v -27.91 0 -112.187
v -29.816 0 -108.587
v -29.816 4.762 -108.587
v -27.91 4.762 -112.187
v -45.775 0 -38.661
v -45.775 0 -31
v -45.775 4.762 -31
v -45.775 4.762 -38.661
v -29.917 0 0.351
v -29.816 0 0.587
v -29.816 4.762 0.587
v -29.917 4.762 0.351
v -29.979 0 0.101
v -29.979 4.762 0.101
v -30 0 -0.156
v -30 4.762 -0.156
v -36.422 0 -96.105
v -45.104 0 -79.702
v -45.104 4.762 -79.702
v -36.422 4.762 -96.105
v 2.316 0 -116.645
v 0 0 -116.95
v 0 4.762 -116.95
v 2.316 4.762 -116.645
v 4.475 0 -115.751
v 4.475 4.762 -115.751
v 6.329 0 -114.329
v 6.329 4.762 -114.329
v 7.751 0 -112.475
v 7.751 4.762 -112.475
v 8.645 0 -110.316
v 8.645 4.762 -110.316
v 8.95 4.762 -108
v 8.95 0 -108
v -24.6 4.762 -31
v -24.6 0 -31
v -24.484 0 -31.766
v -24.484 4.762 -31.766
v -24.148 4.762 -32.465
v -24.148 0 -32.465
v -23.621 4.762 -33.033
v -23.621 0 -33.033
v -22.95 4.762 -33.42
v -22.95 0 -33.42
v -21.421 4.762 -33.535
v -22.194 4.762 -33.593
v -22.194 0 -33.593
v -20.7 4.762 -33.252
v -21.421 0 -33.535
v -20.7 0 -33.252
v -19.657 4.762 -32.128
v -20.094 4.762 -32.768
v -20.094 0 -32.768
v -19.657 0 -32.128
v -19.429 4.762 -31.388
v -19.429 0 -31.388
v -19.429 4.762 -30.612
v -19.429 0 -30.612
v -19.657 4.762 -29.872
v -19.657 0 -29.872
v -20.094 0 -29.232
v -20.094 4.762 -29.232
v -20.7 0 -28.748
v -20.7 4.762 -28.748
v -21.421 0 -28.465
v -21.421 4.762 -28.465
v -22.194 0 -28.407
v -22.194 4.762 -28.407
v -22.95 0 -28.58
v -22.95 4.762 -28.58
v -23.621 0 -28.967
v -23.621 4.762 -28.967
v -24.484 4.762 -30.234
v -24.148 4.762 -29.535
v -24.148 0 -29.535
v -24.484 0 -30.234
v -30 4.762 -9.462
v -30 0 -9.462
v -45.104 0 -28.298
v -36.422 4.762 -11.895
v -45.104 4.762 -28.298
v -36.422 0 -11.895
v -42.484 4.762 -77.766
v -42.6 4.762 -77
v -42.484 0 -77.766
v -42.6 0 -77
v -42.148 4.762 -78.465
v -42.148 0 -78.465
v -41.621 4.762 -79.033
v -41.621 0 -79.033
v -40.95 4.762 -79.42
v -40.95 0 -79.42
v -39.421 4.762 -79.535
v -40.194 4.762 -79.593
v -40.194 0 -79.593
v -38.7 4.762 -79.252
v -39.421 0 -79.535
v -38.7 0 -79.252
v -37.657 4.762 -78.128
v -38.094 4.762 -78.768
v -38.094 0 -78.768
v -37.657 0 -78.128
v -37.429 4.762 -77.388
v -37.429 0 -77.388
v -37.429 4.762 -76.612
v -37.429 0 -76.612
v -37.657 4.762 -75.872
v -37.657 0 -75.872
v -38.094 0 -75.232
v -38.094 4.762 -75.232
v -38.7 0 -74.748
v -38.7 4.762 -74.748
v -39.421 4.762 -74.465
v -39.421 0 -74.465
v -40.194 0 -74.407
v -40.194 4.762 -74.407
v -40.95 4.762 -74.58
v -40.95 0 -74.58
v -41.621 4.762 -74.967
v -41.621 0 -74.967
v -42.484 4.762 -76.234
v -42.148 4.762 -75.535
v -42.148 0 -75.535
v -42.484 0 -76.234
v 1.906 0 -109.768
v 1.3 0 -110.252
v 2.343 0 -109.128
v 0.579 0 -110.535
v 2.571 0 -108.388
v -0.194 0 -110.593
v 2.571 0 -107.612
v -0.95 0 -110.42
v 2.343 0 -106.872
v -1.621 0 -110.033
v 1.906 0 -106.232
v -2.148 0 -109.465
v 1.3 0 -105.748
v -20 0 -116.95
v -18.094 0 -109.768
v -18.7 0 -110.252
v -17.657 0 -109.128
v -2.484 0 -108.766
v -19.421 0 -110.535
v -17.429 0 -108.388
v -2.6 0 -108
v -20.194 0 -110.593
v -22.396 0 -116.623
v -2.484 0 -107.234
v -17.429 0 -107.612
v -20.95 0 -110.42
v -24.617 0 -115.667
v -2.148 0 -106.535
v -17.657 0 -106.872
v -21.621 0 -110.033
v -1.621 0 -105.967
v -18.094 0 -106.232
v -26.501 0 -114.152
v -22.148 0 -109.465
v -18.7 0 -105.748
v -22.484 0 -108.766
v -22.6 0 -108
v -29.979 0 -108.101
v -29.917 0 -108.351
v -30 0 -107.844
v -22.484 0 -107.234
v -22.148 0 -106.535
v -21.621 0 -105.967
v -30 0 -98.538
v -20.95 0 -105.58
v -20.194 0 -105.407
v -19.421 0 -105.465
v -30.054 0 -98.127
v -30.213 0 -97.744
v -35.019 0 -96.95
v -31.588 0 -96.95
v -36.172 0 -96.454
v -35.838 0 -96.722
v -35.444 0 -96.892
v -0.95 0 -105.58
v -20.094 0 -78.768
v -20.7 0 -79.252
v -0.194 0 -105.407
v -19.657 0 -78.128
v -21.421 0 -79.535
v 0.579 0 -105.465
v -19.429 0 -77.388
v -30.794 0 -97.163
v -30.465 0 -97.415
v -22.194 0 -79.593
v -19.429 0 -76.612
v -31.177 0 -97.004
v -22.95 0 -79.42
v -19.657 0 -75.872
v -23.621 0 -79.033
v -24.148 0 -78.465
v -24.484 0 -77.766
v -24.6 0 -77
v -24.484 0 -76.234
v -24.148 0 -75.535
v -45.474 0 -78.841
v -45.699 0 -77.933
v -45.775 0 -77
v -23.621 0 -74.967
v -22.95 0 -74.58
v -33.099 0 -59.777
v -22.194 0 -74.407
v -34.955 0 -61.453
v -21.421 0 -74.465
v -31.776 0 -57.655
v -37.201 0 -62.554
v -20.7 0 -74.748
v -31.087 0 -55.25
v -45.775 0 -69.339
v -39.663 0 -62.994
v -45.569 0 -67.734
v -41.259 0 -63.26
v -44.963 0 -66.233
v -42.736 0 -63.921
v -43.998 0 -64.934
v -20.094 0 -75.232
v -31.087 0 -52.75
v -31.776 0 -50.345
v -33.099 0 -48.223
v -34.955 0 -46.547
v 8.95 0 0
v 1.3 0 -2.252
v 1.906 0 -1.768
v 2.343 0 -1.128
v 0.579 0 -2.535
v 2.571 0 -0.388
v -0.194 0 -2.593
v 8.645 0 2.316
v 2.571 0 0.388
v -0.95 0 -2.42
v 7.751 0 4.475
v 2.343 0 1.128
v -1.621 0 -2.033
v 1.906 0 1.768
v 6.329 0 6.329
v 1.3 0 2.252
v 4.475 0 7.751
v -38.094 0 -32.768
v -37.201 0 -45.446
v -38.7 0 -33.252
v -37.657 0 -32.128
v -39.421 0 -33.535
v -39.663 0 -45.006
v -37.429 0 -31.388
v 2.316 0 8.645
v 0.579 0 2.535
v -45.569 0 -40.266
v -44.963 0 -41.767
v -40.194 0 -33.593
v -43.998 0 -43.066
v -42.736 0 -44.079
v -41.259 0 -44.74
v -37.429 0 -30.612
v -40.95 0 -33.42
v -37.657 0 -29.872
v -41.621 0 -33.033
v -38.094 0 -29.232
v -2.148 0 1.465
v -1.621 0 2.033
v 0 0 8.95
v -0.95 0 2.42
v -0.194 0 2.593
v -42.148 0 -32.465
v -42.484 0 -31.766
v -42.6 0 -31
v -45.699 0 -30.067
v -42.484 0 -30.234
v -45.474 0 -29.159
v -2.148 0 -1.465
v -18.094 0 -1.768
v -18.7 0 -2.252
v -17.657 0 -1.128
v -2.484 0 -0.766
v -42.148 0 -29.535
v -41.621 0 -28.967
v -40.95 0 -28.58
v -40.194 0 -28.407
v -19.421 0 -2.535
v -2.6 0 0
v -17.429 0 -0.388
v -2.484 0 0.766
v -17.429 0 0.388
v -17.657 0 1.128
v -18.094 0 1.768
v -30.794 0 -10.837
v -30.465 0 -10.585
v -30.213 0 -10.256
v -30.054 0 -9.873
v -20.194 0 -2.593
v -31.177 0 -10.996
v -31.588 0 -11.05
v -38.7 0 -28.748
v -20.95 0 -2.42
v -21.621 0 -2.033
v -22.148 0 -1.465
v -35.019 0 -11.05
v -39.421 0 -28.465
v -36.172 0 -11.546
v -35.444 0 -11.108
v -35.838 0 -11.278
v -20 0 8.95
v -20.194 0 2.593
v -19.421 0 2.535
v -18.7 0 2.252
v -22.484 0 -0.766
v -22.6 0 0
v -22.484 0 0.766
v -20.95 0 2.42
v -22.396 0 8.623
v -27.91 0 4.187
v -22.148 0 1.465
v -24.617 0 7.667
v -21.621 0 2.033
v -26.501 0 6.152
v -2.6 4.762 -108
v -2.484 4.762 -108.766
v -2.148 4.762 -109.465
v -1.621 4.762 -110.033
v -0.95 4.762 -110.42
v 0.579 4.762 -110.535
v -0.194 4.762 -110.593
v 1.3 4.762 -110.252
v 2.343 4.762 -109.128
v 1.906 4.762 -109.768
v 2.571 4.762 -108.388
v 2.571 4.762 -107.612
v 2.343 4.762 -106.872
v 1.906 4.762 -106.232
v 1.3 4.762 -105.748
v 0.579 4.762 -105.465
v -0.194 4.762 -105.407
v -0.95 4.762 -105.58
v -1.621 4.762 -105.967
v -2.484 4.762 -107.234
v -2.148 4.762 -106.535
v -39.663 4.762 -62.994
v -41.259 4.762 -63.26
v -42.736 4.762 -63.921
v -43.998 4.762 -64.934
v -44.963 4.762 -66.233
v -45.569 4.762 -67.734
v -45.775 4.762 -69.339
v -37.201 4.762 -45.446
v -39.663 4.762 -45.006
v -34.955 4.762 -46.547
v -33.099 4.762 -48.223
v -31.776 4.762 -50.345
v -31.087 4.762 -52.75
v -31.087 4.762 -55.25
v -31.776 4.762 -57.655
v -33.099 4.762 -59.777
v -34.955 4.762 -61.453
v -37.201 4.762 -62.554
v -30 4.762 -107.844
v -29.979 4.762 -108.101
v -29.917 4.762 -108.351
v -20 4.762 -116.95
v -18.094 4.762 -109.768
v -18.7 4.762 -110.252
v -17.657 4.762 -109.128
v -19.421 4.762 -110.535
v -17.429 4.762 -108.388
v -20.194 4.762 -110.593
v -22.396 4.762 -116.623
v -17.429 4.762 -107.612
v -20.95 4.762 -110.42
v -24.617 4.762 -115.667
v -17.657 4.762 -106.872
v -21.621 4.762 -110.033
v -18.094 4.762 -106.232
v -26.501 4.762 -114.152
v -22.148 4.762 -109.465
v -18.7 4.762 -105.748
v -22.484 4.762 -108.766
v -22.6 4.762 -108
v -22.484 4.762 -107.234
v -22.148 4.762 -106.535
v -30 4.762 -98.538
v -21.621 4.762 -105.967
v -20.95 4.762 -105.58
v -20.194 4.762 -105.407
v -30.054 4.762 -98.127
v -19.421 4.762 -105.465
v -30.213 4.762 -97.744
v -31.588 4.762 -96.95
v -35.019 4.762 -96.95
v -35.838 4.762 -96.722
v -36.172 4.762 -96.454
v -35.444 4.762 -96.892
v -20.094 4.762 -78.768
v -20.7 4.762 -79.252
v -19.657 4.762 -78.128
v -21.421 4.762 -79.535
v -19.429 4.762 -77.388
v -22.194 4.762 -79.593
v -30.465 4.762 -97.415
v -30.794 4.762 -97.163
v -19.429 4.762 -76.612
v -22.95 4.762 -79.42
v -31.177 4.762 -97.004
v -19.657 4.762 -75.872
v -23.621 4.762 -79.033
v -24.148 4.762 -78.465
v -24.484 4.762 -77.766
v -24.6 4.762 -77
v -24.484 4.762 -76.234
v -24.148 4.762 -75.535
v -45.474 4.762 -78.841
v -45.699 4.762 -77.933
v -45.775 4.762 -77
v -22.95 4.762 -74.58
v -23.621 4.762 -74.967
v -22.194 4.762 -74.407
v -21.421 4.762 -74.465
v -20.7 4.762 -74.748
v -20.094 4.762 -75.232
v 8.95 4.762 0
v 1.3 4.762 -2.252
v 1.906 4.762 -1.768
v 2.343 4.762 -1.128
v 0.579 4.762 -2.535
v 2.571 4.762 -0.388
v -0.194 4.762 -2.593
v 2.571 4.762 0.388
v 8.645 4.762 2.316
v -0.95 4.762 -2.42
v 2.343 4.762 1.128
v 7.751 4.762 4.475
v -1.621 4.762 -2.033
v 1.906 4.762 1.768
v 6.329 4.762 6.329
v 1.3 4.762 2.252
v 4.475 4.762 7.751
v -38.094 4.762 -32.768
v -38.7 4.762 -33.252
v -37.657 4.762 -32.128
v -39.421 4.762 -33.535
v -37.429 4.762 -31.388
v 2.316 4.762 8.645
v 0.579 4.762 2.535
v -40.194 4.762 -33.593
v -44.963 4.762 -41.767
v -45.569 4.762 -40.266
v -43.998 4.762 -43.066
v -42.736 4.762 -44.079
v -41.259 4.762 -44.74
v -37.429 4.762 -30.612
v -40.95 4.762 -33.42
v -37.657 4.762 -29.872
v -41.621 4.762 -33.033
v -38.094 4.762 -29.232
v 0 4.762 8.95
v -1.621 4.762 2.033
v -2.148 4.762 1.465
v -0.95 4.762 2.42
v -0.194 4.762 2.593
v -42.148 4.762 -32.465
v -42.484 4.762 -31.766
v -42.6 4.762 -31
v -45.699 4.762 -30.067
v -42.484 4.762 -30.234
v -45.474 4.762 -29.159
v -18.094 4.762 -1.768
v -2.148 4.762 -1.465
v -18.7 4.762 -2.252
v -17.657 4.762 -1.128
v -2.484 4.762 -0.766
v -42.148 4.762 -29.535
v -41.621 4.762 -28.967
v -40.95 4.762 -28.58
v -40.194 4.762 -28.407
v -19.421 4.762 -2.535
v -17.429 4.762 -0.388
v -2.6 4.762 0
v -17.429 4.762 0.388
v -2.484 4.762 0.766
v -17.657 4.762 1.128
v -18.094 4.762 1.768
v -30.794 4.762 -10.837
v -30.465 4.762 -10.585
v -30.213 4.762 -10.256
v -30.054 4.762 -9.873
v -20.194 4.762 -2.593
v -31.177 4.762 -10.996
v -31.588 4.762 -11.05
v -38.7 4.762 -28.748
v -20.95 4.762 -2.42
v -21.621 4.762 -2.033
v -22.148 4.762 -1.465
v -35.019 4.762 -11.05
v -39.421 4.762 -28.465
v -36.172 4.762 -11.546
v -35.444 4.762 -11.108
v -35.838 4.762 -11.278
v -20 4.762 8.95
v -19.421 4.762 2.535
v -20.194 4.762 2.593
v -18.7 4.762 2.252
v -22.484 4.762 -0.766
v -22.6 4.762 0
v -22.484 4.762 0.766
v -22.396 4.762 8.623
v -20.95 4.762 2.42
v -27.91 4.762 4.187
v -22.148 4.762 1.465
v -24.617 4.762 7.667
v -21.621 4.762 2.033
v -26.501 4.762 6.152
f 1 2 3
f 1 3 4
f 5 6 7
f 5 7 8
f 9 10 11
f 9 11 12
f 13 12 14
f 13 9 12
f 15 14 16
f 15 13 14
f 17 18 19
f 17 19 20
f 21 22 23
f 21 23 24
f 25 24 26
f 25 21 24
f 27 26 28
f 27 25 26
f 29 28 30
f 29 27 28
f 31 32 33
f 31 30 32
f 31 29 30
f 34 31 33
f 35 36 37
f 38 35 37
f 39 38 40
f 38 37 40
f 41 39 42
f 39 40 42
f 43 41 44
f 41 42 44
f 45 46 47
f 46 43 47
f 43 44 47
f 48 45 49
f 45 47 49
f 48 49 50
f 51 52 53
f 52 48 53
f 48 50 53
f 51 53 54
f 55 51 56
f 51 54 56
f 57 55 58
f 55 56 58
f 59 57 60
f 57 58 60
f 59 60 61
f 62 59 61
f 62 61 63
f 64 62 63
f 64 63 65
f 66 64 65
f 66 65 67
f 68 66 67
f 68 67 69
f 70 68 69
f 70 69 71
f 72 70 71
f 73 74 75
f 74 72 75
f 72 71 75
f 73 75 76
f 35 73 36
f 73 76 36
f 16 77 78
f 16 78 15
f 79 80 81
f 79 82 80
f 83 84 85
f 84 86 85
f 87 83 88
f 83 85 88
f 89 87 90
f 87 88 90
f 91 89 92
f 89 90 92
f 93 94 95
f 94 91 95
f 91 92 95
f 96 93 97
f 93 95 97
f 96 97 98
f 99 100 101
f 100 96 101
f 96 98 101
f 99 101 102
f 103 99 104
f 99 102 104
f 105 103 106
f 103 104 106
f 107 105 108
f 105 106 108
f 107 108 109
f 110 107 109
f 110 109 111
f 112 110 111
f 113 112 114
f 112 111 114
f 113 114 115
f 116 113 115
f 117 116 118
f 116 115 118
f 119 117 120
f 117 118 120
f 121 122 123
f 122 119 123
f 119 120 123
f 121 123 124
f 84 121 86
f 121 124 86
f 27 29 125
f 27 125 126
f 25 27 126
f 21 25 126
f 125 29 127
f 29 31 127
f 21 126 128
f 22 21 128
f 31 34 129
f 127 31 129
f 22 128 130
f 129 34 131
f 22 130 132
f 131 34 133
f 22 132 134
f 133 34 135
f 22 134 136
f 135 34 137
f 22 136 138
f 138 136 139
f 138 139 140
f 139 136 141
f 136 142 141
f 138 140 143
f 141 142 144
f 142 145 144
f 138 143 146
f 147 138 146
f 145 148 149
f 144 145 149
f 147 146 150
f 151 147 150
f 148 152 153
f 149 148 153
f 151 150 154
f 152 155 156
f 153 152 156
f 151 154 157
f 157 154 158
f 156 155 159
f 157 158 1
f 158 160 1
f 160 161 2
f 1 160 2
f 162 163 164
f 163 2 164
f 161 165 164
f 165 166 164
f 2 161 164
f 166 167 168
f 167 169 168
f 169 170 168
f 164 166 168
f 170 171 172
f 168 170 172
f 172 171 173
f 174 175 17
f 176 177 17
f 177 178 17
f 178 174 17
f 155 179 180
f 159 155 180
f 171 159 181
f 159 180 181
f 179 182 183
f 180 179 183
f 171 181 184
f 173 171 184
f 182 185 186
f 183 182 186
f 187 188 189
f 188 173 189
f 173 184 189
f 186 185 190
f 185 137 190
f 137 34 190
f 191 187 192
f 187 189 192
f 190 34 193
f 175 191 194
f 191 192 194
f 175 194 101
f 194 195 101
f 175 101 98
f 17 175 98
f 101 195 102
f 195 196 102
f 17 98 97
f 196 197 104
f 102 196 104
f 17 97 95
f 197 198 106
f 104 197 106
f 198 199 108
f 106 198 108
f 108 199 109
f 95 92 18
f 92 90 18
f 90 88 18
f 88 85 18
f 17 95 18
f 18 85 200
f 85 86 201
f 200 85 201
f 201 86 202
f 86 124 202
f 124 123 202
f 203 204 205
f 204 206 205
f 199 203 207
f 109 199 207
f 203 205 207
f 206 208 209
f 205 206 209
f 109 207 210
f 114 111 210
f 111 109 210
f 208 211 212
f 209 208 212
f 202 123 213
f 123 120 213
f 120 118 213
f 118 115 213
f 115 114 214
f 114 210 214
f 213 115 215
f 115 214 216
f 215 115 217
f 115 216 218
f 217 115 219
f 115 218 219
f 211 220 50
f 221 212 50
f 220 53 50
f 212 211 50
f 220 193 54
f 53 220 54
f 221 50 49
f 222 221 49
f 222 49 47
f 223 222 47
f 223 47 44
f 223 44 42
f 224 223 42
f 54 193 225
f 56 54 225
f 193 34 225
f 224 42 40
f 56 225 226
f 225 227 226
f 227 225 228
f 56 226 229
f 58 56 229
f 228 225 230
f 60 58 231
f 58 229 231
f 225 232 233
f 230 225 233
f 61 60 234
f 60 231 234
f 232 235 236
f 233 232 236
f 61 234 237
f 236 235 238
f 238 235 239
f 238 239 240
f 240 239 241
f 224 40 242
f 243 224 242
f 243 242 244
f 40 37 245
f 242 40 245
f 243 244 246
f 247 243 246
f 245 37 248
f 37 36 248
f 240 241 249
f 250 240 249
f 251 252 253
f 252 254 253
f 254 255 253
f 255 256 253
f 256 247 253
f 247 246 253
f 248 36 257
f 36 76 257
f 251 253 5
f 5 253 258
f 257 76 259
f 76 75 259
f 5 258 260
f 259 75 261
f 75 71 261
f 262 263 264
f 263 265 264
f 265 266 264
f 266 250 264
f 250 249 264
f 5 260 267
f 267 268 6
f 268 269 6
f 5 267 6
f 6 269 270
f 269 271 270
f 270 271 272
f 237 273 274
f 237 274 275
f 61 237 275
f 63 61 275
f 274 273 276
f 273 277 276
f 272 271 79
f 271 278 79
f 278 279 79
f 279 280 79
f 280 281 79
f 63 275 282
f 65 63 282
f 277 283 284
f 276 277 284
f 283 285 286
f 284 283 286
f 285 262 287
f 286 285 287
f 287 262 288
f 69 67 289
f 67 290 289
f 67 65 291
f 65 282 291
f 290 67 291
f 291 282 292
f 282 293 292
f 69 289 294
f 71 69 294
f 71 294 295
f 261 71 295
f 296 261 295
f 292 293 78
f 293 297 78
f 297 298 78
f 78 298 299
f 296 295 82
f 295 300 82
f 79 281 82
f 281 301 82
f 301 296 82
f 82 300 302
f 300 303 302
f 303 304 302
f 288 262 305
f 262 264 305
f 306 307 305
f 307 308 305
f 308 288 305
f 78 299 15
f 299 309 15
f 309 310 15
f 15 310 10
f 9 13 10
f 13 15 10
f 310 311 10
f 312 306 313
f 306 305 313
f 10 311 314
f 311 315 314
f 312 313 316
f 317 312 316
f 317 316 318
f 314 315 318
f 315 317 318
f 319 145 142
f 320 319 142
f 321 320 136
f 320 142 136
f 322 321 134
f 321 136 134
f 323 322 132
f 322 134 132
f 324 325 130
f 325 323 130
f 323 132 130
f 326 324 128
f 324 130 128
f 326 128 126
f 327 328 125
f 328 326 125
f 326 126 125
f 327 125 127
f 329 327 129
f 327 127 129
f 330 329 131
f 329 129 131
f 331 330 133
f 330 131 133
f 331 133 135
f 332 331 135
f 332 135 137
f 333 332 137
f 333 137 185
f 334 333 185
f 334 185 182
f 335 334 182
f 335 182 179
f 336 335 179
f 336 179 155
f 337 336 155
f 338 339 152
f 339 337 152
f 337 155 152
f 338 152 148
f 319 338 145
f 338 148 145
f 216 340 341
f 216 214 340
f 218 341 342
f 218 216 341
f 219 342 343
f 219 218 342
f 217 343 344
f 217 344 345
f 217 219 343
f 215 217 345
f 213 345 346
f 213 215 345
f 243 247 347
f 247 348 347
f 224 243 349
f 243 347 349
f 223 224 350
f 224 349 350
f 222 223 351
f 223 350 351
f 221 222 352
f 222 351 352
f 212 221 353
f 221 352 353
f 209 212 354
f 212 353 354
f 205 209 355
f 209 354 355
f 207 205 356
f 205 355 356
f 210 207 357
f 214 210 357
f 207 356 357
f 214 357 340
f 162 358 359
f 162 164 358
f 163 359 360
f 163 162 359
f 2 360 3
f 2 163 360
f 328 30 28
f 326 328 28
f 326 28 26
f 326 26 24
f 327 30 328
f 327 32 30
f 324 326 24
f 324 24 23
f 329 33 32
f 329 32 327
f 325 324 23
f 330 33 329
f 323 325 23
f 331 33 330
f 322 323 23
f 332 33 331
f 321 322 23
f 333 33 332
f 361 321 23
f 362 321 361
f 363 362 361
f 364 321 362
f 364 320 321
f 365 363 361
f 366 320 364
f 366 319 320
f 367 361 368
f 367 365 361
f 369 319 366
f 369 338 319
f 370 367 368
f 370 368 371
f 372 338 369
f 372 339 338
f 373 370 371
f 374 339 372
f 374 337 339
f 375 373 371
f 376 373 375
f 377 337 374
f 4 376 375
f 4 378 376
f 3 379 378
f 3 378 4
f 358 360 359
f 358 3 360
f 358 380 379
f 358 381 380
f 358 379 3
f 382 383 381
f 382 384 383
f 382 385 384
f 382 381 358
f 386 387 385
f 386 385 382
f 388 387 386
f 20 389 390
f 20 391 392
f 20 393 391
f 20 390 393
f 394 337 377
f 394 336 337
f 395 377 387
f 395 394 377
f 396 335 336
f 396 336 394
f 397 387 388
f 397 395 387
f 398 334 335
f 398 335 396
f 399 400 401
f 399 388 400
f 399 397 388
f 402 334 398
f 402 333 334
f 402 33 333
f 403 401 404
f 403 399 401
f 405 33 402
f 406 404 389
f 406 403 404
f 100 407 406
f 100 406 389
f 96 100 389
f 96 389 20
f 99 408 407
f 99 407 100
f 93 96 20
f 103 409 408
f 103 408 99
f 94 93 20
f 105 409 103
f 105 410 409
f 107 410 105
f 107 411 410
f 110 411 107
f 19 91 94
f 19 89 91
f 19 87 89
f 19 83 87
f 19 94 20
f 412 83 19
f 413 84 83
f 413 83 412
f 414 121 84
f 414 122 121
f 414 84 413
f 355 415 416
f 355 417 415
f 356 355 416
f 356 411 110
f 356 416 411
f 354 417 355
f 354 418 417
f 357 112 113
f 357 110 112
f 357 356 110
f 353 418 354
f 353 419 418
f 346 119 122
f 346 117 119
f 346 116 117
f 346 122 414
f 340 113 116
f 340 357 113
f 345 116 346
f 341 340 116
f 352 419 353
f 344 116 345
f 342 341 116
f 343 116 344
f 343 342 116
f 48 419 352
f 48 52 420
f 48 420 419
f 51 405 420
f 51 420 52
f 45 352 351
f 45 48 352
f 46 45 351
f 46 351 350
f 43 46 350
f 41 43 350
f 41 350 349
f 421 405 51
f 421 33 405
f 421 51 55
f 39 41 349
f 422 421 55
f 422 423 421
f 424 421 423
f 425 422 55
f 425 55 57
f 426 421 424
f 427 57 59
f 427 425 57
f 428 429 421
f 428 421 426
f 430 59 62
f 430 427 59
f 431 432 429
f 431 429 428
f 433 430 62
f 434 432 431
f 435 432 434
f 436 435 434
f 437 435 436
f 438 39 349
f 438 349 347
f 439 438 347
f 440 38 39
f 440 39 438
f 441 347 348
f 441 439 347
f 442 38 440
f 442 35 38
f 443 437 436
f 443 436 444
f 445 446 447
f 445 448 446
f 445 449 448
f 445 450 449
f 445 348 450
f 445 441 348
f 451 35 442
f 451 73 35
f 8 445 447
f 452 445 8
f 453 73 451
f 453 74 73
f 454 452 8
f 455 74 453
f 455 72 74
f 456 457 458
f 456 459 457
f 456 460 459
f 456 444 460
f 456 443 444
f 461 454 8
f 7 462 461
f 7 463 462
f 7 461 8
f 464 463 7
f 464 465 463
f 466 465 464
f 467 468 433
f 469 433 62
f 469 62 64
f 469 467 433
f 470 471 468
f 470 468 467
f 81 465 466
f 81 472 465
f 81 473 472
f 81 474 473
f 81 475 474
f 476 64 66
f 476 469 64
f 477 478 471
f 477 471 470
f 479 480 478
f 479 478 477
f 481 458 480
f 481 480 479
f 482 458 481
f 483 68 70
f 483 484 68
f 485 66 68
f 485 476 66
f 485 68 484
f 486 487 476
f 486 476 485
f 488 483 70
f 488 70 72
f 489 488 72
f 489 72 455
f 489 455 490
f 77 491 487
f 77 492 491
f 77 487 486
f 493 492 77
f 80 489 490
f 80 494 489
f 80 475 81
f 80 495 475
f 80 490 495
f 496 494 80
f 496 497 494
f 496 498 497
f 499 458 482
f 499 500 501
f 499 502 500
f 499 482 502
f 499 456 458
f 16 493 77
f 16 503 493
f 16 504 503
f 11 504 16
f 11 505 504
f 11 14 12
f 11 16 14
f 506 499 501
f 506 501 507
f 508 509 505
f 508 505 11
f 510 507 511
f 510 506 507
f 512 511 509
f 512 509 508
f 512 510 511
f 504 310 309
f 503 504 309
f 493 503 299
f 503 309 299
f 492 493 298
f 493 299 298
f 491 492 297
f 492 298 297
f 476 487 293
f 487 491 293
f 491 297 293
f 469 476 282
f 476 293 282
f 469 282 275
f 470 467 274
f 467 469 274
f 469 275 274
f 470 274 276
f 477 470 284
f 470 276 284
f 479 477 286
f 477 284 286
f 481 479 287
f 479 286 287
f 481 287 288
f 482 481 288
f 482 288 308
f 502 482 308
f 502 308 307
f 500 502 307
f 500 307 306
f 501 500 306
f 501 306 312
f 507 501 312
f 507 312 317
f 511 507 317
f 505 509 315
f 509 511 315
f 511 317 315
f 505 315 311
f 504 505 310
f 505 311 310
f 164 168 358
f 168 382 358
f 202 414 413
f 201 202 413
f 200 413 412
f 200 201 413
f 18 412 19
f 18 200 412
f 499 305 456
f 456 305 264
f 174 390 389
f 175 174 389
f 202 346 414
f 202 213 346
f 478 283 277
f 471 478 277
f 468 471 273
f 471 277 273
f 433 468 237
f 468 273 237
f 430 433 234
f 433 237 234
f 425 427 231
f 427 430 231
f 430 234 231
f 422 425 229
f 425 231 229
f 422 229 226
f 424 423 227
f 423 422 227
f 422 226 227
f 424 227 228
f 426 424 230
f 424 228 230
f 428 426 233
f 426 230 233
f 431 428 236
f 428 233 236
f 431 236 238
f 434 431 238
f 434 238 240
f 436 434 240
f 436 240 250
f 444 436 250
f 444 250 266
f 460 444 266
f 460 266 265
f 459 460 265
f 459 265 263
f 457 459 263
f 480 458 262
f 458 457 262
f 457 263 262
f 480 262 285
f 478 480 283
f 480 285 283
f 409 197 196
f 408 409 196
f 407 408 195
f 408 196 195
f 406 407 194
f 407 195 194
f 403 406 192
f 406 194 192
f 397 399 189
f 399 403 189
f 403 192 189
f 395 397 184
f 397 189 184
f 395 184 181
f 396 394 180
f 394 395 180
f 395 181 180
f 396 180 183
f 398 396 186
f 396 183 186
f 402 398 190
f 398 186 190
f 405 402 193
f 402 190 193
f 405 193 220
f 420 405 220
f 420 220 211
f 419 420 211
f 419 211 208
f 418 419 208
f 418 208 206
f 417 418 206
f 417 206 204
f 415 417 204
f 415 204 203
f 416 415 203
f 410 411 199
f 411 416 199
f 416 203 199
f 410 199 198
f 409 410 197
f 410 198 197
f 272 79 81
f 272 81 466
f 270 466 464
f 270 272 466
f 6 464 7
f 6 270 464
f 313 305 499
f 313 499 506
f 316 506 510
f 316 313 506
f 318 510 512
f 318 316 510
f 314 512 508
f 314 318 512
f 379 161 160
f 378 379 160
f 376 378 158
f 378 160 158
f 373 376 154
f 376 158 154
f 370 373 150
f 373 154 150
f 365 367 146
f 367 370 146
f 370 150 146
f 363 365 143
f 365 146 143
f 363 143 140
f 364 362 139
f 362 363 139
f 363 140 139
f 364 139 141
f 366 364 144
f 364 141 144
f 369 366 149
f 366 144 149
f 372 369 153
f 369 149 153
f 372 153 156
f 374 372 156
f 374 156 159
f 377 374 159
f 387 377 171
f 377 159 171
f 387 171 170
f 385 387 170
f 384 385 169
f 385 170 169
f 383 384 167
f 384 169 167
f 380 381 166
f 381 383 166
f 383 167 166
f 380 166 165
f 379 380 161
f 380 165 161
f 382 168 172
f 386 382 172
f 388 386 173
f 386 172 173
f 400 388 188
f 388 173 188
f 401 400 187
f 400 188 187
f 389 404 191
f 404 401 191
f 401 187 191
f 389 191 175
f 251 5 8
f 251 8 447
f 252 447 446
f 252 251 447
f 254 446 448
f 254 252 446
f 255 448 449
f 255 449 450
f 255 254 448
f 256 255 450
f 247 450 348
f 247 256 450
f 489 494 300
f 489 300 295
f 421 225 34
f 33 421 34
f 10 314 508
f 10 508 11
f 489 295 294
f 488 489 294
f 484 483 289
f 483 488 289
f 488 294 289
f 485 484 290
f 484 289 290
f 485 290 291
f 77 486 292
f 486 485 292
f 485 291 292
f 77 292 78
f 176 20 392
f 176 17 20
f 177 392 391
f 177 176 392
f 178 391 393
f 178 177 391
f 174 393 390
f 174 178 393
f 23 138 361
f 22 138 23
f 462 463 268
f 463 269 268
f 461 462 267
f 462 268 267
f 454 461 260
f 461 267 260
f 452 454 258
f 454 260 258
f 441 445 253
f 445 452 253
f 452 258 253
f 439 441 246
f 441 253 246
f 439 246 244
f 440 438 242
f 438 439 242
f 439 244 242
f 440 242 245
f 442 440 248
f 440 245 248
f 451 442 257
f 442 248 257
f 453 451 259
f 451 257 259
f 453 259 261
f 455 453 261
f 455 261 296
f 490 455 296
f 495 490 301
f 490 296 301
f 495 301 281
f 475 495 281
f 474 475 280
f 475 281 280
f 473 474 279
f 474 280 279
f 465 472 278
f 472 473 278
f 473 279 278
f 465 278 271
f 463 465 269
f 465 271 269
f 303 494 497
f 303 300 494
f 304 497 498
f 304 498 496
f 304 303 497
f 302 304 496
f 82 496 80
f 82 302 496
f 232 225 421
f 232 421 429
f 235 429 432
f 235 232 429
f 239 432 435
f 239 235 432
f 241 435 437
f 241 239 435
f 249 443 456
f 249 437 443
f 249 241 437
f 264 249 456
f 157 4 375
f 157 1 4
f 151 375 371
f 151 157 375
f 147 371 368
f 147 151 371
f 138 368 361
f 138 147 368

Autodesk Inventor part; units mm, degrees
ref_plane "YZ Plane" through (0, 0, 0) normal (1, 0, 0) x (0, 1, 0)
ref_plane "XZ Plane" through (0, 0, 0) normal (0, 1, 0) x (-1, 0, 0)
ref_plane "XY Plane" through (0, 0, 0) normal (0, 0, 1) x (1, 0, 0)
sketch "Sketch1" plane through (0, 0, 0) normal (0, 1, 0) x (-1, 0, 0)
  circle A0 centre (0, 0) radius 2.6
  line L0 (0, 0) -> (2.6, 0) construction
  circle A1 centre (20, 0) radius 2.6
  circle A2 centre (22, -31) radius 2.6
  line L1 (22, -31) -> (24.6, -31) construction
  line L2 (22, -31) -> (22, -33.6) construction
  circle A3 centre (40, -31) radius 2.6
  circle A4 centre (22, -77) radius 2.6
  circle A5 centre (40, -77) radius 2.6
  circle A6 centre (20, -108) radius 2.6
  circle A7 centre (0, -108) radius 2.6
  circle A8 centre (20, 0) radius 8.95 construction
  circle A9 centre (0, 0) radius 8.95 construction
  circle A10 centre (20, -108) radius 8.95 construction
  circle A11 centre (0, -108) radius 8.95 construction
  circle A12 centre (40, -31) radius 5.775 construction
  circle A13 centre (40, -77) radius 5.775 construction
  line L3 (27.9103, 4.1868) -> (45.1042, -28.2985)
  line L4 (45.1042, -79.7015) -> (27.9103, -112.1868)
  line L5 (-8.95, 0) -> (-8.95, -108)
  line L6 (20, 8.95) -> (0, 8.95)
  line L7 (20, -116.95) -> (0, -116.95)
  line L8 (45.775, -31) -> (45.775, -77)
  arc A14 (45.1042, -79.7015) -> (45.775, -77) centre (40, -77) ccw
  arc A15 (45.775, -31) -> (45.1042, -28.2985) centre (40, -31) ccw
  arc A16 (27.9103, 4.1868) -> (20, 8.95) centre (20, 0) ccw
  arc A17 (0, 8.95) -> (-8.95, 0) centre (0, 0) ccw
  arc A18 (-8.95, -108) -> (0, -116.95) centre (0, -108) ccw
  arc A19 (20, -116.95) -> (27.9103, -112.1868) centre (20, -108) ccw
  point P0 (42.6, -31)
  point P1 (40, -33.6)
  point P2 (24.6, -77)
  point P3 (22, -79.6)
  point P4 (42.6, -77)
  point P5 (40, -79.6)
  dimension "d0" = 5.2
  dimension "d1" = 20
  dimension "d2" = 31
  dimension "d3" = 22
  dimension "d6" = 18
  dimension "d9" = 46
  dimension "d12" = 31
  dimension "d13" = 6.35
  dimension "d14" = 3.175
extrude "Extrusion1" add sketch "Sketch1" along normal blind 4.7625
sketch "Sketch2" plane through (0, 4.7625, 0) normal (0, 1, 0) x (1, 0, 0)
  arc A0 (0, -8.95) -> (8.95, 0) centre (0, 0) ccw projected
  line L0 (8.95, 0) -> (8.95, 108) projected
  arc A1 (8.95, 108) -> (0, 116.95) centre (0, 108) ccw projected
  line L1 (0, 116.95) -> (-20, 116.95) projected
  arc A2 (-20, 116.95) -> (-27.9103, 112.1868) centre (-20, 108) ccw projected
  line L2 (-27.9103, 112.1868) -> (-45.1042, 79.7015) projected
  arc A3 (-45.1042, 79.7015) -> (-45.775, 77) centre (-40, 77) ccw projected
  line L3 (-45.775, 77) -> (-45.775, 31) projected
  arc A4 (-45.775, 31) -> (-45.1042, 28.2985) centre (-40, 31) ccw projected
  line L4 (-45.1042, 28.2985) -> (-27.9103, -4.1868) projected
  arc A5 (-27.9103, -4.1868) -> (-20, -8.95) centre (-20, 0) ccw projected
  line L5 (-20, -8.95) -> (0, -8.95) projected
  circle A6 centre (-20, 0) radius 2.6 projected
  circle A7 centre (-22, 31) radius 2.6 projected
  circle A8 centre (-40, 31) radius 2.6 projected
  circle A9 centre (-22, 77) radius 2.6 projected
  circle A10 centre (-40, 77) radius 2.6 projected
  circle A11 centre (-20, 108) radius 2.6 projected
  circle A12 centre (0, 108) radius 2.6 projected
  circle A13 centre (0, 0) radius 2.6 projected
  circle A14 centre (-40, 54) radius 9
  point P0 (-45.775, 60.9029)
  point P1 (-45.775, 47.0971)
  dimension "d17" = 18
  dimension "d18" = 46
  dimension "d19" = 23
extrude "Extrusion2" cut sketch "Sketch2" against normal through all contours L3 A14 picked at (-38.3999, 55.6279)
fillet "Fillet1" radius 6.35 2 edges at (-45.775, 2.3813, -47.0971) (-45.775, 2.3813, -60.9029)
sketch "Sketch3" plane through (0, 4.7625, 0) normal (0, 1, 0) x (1, 0, 0)
  line L0 (-45.1042, 28.2985) -> (-27.9103, -4.1868) projected
  line L1 (-35.9749, 11.05) -> (-30, 11.05)
  line L2 (-30, 11.05) -> (-30, -0.2387)
  line L3 (-20, -8.95) -> (0, -8.95) projected
  line L4 (-27.9103, 112.1868) -> (-45.1042, 79.7015) projected
  line L5 (-35.9749, 96.95) -> (-30, 96.95)
  line L6 (-30, 96.95) -> (-30, 108.2387)
  circle A0 centre (-20, 0) radius 2.6 projected
  point P0 (0, 0)
  dimension "d23" = 20
  dimension "d24" = 10
extrude "Extrusion3" cut sketch "Sketch3" against normal through all contours L1 L2 L0 | L6 L5 L4
fillet "Fillet2" radius 1.5875 6 edges at (-30, 2.3813, -11.05) (-30, 2.3813, 0.2387) (-35.9749, 2.3813, -11.05) (-35.9749, 2.3813, -96.95) (-30, 2.3813, -96.95) (-30, 2.3813, -108.2387)
equation "\"d12\" = d2"
equation "\"d19\" = 0.5 * d18"
properties part number "CNC-001-StructureGusset2" material "Steel AISI 1008 91 HR"
